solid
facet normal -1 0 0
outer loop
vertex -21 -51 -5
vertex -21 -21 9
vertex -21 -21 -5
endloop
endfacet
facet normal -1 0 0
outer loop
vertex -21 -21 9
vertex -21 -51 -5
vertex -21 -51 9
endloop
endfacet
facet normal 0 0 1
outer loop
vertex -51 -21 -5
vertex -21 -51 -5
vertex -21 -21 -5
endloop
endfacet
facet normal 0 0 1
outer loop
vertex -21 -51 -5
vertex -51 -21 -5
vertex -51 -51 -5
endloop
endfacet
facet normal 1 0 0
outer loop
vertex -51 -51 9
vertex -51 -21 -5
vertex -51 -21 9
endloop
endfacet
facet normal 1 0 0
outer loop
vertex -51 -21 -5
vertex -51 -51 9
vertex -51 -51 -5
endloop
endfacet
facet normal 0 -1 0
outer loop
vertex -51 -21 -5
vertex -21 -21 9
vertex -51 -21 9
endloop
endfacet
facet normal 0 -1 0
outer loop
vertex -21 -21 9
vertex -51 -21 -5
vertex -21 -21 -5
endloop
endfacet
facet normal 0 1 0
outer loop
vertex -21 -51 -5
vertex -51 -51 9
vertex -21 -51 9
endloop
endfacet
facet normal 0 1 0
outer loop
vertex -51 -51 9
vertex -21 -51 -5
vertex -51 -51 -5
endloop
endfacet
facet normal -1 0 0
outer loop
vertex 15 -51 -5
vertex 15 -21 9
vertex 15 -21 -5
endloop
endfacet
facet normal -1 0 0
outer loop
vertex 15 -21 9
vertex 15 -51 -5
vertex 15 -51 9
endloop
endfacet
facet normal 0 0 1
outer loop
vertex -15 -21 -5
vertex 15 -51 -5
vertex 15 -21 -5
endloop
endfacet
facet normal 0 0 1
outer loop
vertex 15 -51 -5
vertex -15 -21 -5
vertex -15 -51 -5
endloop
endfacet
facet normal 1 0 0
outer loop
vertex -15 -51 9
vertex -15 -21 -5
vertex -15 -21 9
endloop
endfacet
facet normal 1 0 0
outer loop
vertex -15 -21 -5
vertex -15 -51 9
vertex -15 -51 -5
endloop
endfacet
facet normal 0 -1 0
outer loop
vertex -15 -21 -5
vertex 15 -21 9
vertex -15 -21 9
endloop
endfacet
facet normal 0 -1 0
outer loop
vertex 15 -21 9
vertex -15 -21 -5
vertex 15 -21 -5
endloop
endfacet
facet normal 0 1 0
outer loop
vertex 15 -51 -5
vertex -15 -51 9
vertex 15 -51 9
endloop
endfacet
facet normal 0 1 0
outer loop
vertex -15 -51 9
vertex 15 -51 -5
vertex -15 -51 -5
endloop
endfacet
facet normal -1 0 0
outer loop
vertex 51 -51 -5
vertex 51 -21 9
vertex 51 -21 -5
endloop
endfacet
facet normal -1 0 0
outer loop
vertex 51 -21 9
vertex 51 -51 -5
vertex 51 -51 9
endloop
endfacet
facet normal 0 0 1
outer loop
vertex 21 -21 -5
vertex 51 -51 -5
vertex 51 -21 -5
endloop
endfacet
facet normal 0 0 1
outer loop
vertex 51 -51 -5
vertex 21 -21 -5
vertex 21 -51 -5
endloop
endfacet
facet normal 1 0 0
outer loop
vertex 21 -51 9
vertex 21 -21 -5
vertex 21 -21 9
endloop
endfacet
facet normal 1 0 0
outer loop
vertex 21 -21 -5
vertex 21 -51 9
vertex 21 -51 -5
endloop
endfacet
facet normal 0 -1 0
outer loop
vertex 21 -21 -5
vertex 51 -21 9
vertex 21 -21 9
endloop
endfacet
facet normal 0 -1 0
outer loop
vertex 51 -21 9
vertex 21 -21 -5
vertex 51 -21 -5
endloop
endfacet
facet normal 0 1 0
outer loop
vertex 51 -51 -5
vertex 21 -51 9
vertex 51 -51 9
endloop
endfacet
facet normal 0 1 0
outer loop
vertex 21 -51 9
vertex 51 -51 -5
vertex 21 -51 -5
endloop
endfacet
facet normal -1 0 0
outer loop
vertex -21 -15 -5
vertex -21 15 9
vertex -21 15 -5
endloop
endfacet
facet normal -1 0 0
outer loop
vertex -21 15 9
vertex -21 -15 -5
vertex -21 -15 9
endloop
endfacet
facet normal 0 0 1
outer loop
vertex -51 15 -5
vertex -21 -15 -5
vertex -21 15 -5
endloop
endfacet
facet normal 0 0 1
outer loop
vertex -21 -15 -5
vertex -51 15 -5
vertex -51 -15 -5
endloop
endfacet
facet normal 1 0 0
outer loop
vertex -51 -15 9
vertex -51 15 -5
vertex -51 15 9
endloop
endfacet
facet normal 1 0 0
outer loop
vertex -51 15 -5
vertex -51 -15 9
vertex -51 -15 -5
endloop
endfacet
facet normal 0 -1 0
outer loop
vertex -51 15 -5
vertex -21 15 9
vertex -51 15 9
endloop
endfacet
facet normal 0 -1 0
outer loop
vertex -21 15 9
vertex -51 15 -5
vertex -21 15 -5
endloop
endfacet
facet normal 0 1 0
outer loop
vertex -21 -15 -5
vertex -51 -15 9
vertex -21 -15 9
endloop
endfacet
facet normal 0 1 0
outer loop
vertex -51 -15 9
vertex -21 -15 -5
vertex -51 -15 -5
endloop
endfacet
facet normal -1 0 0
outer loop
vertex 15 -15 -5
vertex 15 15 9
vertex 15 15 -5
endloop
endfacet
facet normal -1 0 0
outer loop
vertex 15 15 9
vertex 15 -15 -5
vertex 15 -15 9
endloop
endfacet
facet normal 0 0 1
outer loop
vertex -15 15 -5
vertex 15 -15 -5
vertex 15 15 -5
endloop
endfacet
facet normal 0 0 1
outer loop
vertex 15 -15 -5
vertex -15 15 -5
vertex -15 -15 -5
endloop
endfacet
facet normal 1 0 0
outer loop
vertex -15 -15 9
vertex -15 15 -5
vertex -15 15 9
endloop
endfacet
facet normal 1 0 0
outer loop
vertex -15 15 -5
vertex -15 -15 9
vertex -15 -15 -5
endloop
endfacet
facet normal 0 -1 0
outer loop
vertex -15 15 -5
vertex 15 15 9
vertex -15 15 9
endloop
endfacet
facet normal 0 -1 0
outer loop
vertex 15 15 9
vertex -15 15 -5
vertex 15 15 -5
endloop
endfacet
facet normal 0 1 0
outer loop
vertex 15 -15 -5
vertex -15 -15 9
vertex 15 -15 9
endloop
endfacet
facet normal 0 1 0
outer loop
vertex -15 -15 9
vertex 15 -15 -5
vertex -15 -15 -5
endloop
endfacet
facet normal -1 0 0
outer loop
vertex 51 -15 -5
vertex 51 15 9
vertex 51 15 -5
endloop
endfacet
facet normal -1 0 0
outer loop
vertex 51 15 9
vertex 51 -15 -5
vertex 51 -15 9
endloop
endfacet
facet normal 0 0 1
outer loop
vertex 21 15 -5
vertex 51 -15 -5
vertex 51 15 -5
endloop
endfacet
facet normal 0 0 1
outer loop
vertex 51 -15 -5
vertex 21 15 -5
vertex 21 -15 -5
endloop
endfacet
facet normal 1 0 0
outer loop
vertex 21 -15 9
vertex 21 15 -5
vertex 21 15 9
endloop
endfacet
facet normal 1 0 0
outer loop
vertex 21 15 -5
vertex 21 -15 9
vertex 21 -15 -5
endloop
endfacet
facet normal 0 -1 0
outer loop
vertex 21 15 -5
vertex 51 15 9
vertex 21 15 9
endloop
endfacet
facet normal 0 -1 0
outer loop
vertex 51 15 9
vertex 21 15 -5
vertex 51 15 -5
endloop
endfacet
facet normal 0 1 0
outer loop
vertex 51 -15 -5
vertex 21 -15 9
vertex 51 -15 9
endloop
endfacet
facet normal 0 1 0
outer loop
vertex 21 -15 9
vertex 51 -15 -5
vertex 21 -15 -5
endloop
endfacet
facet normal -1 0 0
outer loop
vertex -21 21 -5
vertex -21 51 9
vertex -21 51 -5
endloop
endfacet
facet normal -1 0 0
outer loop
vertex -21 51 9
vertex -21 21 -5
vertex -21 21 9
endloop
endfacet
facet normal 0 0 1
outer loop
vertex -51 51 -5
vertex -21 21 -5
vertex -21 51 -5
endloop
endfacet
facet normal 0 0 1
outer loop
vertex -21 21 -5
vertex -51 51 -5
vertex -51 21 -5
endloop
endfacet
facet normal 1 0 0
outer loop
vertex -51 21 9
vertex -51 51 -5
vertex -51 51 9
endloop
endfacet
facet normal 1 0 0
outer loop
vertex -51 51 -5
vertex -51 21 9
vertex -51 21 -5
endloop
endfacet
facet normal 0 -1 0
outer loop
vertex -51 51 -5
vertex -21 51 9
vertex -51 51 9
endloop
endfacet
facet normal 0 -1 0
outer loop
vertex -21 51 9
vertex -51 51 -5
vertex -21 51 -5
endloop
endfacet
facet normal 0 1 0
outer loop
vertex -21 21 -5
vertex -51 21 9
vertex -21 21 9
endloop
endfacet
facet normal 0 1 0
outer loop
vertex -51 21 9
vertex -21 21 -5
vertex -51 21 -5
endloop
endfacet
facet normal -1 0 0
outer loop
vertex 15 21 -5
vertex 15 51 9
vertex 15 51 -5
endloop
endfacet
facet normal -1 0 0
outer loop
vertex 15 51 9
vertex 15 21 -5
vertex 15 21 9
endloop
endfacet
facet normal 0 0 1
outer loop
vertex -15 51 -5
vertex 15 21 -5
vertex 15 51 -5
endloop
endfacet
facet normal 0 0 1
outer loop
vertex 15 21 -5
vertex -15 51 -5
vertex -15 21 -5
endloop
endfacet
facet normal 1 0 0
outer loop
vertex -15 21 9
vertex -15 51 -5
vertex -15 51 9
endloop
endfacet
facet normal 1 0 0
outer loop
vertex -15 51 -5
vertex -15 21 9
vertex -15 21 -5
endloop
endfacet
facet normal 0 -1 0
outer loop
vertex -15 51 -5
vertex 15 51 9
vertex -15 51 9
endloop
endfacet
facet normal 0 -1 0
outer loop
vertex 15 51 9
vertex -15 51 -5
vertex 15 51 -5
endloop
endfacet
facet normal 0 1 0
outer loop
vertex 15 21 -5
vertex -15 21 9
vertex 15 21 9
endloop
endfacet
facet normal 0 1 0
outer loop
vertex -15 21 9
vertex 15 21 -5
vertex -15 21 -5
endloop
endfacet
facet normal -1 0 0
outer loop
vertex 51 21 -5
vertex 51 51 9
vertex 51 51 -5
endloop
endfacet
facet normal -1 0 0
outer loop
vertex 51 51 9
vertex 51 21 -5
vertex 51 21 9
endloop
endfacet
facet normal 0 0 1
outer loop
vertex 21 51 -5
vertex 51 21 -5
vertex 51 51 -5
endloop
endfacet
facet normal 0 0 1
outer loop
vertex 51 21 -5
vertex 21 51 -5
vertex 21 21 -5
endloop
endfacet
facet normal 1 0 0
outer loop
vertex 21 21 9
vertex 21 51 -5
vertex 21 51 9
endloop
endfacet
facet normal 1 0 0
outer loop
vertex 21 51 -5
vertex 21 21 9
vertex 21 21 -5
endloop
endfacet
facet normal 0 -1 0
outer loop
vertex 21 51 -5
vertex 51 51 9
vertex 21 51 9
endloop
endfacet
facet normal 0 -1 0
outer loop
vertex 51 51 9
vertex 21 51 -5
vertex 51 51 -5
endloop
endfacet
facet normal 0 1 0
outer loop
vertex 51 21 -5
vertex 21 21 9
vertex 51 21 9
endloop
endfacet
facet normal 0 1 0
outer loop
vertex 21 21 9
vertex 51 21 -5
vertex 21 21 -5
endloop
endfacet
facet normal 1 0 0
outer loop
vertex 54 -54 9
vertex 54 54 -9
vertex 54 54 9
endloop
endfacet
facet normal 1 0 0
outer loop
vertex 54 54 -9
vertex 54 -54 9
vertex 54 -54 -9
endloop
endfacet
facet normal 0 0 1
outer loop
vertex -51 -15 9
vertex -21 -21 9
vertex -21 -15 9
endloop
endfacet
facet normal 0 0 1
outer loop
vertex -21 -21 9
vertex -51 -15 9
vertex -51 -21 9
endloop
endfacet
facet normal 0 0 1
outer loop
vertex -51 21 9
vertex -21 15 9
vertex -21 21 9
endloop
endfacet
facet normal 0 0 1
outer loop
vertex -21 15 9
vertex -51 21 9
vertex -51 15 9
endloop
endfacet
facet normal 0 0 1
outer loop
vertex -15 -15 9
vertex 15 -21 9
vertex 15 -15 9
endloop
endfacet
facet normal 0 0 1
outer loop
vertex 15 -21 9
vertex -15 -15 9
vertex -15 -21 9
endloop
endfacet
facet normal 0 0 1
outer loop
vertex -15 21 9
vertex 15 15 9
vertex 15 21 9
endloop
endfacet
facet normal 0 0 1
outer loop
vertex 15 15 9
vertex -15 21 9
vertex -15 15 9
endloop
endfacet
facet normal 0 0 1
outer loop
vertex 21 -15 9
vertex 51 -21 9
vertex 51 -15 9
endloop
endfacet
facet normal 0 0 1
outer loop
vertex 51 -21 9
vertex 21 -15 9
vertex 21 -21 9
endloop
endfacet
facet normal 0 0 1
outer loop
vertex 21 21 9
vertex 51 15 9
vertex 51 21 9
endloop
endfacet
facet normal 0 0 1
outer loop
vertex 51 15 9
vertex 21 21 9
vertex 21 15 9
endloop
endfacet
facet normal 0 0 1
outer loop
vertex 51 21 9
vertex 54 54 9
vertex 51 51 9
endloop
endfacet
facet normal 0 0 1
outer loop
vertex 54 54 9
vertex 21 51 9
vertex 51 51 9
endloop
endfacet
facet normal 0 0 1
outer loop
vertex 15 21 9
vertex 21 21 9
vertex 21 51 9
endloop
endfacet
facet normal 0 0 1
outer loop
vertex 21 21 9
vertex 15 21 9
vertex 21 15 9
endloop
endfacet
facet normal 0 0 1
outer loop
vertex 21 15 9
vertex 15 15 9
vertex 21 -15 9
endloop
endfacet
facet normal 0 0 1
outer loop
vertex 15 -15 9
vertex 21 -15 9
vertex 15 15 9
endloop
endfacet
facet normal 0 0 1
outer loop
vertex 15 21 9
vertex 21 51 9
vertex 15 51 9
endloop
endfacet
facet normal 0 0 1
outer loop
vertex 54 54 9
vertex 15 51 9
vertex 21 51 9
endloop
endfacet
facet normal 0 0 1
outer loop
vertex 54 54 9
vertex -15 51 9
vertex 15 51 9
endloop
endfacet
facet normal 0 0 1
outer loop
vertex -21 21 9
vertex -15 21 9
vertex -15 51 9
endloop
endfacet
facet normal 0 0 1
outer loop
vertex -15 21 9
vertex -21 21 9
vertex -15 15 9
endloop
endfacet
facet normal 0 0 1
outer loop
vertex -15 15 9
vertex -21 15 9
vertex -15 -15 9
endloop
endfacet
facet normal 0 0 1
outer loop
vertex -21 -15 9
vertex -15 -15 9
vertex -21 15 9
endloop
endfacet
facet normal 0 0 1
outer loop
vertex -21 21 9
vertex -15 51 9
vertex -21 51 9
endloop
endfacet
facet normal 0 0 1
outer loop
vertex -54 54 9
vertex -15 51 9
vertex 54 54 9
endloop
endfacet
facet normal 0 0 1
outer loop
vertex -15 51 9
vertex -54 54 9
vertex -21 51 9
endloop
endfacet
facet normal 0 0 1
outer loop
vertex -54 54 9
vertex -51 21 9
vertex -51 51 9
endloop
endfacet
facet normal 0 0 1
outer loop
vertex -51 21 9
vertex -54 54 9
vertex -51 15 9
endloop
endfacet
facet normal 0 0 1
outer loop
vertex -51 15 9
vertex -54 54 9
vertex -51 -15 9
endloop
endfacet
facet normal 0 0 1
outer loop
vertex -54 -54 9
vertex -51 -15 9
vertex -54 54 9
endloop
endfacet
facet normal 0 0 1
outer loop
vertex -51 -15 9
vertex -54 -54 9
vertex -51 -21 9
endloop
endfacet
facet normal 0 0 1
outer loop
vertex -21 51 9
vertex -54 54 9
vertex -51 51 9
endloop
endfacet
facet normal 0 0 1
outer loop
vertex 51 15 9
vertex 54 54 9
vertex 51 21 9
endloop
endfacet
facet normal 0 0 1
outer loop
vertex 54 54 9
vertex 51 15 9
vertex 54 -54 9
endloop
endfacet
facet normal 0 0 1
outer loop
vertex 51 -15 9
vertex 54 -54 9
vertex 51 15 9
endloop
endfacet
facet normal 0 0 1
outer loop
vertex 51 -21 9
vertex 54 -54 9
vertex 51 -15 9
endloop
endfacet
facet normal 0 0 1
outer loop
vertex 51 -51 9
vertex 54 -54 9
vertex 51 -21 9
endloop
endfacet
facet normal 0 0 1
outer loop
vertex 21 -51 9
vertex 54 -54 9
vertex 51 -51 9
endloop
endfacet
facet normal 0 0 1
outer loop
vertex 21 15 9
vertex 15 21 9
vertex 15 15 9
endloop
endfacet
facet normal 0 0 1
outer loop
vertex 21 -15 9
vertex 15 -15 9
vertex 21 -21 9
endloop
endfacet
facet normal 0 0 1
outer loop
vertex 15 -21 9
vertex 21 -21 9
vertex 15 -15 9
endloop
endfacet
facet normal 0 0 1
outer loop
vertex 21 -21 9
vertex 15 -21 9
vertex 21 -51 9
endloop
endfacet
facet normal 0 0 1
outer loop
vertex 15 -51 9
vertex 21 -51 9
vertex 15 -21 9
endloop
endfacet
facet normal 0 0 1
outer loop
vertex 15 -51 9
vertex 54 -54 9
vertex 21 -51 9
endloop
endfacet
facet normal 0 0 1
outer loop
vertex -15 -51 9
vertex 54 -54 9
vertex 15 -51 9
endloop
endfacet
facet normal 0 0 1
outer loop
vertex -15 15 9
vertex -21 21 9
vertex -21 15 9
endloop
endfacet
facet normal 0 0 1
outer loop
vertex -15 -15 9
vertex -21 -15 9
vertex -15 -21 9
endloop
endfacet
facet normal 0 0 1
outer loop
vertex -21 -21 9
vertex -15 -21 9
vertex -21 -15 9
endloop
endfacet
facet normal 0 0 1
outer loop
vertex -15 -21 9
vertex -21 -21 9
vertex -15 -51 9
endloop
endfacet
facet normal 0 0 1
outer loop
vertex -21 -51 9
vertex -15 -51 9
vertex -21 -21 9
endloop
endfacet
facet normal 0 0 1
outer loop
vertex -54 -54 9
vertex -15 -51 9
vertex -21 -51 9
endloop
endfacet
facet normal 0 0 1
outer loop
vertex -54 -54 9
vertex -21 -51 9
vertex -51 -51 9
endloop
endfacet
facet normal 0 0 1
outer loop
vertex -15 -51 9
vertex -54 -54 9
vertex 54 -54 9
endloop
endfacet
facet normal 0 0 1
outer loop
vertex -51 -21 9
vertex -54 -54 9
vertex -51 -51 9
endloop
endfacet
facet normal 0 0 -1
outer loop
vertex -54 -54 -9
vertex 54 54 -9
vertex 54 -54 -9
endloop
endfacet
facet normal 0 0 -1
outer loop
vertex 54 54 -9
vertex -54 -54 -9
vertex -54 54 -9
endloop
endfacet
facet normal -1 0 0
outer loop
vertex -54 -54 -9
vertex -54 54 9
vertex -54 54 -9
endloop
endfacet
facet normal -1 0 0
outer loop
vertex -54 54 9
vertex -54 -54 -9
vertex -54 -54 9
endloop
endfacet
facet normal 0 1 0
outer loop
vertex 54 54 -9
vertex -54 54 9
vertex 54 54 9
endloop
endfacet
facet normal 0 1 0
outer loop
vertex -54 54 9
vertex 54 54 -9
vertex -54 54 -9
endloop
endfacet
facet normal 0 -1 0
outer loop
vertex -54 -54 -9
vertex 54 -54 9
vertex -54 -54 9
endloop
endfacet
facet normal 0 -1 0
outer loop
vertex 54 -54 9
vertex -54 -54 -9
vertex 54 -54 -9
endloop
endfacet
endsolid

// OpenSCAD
$fn = 32;

// ----------------------------------------------------------------------
// Pocket plate 108 x 108 x 18
// 3 x 3 pockets 30 mm square, 14 mm deep
// ----------------------------------------------------------------------

// --- parameters (mm) ---
thickness = 18;  // plate thickness
floor_t = 4;     // material left under each pocket
pocket = 30;     // pocket side length
pitch_x = 36;    // pocket pitch along X
pitch_y = 36;    // pocket pitch along Y
cols = 3;        // pockets per row
rows = 3;        // rows of pockets

// --- derived feature positions (mm) ---
depth = thickness - floor_t;        // = 14   pocket depth, down to the floor
span_x = (cols - 1) * pitch_x;      // = 72   distance between outer pockets
span_y = (rows - 1) * pitch_y;      // = 72   distance between outer pocket rows
origin_x = -span_x / 2;             // = -36   X of the first pocket
origin_y = -span_y / 2;             // = -36   Y of the first pocket
plate = [span_x + pocket + 6, span_y + pocket + 6, thickness];  // = [108, 108, 18]   overall size: pockets plus 3 mm of wall on each side
feature_centers = [
  [origin_x + 0 * pitch_x, origin_y + 0 * pitch_y],
  [origin_x + 1 * pitch_x, origin_y + 0 * pitch_y],
  [origin_x + 2 * pitch_x, origin_y + 0 * pitch_y],
  [origin_x + 0 * pitch_x, origin_y + 1 * pitch_y],
  [origin_x + 1 * pitch_x, origin_y + 1 * pitch_y],
  [origin_x + 2 * pitch_x, origin_y + 1 * pitch_y],
  [origin_x + 0 * pitch_x, origin_y + 2 * pitch_y],
  [origin_x + 1 * pitch_x, origin_y + 2 * pitch_y],
  [origin_x + 2 * pitch_x, origin_y + 2 * pitch_y]
];   // pocket centres, used verbatim by the cutter loop

// plate outline, then one pocket per centre in feature_centers
difference() {
  cube(plate, center = true);
  for (centre = feature_centers)
    translate([centre[0] - pocket / 2, centre[1] - pocket / 2, plate[2] / 2 - depth])
      cube([pocket, pocket, depth + 1]);  // centred on the declared pocket centre
}
